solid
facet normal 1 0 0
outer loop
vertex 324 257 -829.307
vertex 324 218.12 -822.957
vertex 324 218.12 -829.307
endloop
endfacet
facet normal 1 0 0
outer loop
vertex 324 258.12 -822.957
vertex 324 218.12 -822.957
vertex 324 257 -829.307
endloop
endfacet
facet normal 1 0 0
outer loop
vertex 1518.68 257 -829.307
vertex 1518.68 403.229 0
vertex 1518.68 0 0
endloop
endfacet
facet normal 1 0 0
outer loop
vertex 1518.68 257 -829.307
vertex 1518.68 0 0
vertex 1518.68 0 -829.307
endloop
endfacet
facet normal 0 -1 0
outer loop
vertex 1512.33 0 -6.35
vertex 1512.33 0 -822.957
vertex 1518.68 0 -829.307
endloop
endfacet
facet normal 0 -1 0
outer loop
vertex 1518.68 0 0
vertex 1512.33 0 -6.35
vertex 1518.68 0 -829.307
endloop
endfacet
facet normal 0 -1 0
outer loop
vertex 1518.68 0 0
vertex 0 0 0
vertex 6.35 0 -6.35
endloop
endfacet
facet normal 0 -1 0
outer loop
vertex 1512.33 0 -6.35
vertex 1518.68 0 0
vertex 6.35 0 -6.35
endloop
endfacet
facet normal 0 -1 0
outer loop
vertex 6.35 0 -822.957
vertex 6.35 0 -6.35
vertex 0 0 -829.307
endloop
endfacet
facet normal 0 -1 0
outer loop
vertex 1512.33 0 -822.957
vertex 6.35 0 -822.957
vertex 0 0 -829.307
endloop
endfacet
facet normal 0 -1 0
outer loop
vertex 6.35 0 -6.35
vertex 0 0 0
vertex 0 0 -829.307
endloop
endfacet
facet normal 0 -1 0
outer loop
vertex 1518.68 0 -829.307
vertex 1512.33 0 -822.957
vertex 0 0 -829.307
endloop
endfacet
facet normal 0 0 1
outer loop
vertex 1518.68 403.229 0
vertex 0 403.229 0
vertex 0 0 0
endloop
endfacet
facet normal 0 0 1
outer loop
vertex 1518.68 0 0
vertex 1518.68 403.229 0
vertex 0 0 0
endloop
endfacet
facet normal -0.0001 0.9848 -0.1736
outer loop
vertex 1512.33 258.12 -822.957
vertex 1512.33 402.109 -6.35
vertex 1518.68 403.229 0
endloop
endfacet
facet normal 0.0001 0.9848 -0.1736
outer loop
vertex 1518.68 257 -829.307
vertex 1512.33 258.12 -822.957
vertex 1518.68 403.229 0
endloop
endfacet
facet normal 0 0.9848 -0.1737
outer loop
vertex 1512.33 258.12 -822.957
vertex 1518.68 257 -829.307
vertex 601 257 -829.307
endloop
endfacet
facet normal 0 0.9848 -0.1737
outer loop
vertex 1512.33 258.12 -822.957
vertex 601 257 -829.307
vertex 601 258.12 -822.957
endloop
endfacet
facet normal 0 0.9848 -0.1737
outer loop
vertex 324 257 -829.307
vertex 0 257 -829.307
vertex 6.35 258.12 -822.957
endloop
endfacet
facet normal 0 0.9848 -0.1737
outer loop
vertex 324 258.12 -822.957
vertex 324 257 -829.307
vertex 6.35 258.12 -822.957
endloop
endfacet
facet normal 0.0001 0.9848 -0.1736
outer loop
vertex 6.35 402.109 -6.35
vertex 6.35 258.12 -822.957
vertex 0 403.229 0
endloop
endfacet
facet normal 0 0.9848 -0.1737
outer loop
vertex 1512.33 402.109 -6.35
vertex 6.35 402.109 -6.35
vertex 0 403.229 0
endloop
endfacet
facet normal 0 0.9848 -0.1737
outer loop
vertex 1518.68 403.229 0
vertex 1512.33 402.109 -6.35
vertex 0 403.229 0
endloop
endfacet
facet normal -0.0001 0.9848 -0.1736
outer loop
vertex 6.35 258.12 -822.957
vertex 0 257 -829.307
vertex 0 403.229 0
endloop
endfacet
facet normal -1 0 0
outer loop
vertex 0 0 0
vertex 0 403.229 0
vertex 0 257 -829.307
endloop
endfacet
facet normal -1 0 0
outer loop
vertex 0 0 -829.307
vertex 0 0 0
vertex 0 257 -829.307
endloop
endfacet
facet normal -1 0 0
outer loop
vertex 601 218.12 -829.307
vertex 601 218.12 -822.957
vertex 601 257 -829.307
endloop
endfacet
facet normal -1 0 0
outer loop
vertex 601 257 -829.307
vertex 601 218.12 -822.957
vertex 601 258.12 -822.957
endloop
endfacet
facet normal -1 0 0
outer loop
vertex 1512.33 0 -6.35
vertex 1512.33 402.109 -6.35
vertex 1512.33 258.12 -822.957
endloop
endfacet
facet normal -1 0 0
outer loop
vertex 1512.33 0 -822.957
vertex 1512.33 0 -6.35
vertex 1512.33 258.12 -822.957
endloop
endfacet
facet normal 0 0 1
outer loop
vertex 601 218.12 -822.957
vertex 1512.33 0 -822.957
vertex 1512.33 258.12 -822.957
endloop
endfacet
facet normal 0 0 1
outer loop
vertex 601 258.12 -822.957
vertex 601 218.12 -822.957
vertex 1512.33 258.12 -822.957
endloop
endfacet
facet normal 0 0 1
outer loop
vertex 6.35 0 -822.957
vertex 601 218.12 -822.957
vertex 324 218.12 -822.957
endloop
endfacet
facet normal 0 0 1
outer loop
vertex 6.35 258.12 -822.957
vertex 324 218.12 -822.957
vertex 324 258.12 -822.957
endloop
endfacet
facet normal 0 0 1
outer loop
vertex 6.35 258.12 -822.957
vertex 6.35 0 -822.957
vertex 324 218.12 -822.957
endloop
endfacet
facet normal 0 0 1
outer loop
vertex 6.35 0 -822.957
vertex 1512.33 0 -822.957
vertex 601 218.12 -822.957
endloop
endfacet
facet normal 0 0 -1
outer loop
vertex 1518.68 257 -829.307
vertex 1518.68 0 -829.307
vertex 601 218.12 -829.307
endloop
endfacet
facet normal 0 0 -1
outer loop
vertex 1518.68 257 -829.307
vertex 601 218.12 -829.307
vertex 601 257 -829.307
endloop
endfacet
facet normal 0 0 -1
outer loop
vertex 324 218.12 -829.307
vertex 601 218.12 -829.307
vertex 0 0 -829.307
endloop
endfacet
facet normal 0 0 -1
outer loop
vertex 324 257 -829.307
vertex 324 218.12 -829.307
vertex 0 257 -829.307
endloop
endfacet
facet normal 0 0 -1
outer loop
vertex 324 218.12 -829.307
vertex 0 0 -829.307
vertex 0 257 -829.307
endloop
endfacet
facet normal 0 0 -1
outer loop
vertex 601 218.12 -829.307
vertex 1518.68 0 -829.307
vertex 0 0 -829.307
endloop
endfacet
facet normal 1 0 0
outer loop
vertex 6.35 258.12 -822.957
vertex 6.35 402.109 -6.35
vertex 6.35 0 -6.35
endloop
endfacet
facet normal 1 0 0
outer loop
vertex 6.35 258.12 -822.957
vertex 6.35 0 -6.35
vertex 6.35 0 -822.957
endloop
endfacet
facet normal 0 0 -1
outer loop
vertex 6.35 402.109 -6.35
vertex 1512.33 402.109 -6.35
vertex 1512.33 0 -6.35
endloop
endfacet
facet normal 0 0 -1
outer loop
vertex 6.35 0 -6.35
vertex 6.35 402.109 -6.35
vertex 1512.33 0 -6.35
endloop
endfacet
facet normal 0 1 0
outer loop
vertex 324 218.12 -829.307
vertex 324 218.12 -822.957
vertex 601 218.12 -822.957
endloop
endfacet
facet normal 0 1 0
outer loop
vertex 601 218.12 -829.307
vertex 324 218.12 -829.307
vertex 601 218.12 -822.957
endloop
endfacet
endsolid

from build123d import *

# Parameters (mm, degrees)
BOSS_EXTRUDE1_DEPTH = 1518.68
SHELL1_T            = -6.35
CUT_EXTRUDE2_REACH  = 1775.764
SKETCH3_W           = 277
SKETCH3_H           = 50


with BuildPart() as part:
    # Sketch1 → Boss-Extrude1 (new body)
    with BuildSketch(Plane(origin=(0, 0, 0), x_dir=(0, 0, -1), z_dir=(1, 0, 0))):
        Polygon((0, 403.229130413), (0, 0), (829.306608812, 0), (829.306608812, 257), align=None)
    extrude(amount=BOSS_EXTRUDE1_DEPTH)

    # Shell1
    shell1_openings = [part.faces().sort_by_distance(p)[0] for p in [
        (759.34, 330.114565207, -414.653304406),
        (759.34, 0, -414.653304406),
    ]]
    offset(amount=SHELL1_T, openings=shell1_openings, kind=Kind.INTERSECTION)

    # Sketch3 → Cut-Extrude2 (cut, up to next)
    with BuildSketch(Plane.XY.offset(-822.956608812), mode=Mode.PRIVATE) as cut_extrude2_sk1:
        with Locations((462.5, 243.119676327)):
            Rectangle(SKETCH3_W, SKETCH3_H)
    cut_extrude2_tool1 = extrude(cut_extrude2_sk1.sketch, amount=-CUT_EXTRUDE2_REACH, mode=Mode.PRIVATE) & part.part
    add(cut_extrude2_tool1.solids().sort_by_distance((462.5, 243.119676, -822.956609))[0], mode=Mode.SUBTRACT)


solid = part.part
